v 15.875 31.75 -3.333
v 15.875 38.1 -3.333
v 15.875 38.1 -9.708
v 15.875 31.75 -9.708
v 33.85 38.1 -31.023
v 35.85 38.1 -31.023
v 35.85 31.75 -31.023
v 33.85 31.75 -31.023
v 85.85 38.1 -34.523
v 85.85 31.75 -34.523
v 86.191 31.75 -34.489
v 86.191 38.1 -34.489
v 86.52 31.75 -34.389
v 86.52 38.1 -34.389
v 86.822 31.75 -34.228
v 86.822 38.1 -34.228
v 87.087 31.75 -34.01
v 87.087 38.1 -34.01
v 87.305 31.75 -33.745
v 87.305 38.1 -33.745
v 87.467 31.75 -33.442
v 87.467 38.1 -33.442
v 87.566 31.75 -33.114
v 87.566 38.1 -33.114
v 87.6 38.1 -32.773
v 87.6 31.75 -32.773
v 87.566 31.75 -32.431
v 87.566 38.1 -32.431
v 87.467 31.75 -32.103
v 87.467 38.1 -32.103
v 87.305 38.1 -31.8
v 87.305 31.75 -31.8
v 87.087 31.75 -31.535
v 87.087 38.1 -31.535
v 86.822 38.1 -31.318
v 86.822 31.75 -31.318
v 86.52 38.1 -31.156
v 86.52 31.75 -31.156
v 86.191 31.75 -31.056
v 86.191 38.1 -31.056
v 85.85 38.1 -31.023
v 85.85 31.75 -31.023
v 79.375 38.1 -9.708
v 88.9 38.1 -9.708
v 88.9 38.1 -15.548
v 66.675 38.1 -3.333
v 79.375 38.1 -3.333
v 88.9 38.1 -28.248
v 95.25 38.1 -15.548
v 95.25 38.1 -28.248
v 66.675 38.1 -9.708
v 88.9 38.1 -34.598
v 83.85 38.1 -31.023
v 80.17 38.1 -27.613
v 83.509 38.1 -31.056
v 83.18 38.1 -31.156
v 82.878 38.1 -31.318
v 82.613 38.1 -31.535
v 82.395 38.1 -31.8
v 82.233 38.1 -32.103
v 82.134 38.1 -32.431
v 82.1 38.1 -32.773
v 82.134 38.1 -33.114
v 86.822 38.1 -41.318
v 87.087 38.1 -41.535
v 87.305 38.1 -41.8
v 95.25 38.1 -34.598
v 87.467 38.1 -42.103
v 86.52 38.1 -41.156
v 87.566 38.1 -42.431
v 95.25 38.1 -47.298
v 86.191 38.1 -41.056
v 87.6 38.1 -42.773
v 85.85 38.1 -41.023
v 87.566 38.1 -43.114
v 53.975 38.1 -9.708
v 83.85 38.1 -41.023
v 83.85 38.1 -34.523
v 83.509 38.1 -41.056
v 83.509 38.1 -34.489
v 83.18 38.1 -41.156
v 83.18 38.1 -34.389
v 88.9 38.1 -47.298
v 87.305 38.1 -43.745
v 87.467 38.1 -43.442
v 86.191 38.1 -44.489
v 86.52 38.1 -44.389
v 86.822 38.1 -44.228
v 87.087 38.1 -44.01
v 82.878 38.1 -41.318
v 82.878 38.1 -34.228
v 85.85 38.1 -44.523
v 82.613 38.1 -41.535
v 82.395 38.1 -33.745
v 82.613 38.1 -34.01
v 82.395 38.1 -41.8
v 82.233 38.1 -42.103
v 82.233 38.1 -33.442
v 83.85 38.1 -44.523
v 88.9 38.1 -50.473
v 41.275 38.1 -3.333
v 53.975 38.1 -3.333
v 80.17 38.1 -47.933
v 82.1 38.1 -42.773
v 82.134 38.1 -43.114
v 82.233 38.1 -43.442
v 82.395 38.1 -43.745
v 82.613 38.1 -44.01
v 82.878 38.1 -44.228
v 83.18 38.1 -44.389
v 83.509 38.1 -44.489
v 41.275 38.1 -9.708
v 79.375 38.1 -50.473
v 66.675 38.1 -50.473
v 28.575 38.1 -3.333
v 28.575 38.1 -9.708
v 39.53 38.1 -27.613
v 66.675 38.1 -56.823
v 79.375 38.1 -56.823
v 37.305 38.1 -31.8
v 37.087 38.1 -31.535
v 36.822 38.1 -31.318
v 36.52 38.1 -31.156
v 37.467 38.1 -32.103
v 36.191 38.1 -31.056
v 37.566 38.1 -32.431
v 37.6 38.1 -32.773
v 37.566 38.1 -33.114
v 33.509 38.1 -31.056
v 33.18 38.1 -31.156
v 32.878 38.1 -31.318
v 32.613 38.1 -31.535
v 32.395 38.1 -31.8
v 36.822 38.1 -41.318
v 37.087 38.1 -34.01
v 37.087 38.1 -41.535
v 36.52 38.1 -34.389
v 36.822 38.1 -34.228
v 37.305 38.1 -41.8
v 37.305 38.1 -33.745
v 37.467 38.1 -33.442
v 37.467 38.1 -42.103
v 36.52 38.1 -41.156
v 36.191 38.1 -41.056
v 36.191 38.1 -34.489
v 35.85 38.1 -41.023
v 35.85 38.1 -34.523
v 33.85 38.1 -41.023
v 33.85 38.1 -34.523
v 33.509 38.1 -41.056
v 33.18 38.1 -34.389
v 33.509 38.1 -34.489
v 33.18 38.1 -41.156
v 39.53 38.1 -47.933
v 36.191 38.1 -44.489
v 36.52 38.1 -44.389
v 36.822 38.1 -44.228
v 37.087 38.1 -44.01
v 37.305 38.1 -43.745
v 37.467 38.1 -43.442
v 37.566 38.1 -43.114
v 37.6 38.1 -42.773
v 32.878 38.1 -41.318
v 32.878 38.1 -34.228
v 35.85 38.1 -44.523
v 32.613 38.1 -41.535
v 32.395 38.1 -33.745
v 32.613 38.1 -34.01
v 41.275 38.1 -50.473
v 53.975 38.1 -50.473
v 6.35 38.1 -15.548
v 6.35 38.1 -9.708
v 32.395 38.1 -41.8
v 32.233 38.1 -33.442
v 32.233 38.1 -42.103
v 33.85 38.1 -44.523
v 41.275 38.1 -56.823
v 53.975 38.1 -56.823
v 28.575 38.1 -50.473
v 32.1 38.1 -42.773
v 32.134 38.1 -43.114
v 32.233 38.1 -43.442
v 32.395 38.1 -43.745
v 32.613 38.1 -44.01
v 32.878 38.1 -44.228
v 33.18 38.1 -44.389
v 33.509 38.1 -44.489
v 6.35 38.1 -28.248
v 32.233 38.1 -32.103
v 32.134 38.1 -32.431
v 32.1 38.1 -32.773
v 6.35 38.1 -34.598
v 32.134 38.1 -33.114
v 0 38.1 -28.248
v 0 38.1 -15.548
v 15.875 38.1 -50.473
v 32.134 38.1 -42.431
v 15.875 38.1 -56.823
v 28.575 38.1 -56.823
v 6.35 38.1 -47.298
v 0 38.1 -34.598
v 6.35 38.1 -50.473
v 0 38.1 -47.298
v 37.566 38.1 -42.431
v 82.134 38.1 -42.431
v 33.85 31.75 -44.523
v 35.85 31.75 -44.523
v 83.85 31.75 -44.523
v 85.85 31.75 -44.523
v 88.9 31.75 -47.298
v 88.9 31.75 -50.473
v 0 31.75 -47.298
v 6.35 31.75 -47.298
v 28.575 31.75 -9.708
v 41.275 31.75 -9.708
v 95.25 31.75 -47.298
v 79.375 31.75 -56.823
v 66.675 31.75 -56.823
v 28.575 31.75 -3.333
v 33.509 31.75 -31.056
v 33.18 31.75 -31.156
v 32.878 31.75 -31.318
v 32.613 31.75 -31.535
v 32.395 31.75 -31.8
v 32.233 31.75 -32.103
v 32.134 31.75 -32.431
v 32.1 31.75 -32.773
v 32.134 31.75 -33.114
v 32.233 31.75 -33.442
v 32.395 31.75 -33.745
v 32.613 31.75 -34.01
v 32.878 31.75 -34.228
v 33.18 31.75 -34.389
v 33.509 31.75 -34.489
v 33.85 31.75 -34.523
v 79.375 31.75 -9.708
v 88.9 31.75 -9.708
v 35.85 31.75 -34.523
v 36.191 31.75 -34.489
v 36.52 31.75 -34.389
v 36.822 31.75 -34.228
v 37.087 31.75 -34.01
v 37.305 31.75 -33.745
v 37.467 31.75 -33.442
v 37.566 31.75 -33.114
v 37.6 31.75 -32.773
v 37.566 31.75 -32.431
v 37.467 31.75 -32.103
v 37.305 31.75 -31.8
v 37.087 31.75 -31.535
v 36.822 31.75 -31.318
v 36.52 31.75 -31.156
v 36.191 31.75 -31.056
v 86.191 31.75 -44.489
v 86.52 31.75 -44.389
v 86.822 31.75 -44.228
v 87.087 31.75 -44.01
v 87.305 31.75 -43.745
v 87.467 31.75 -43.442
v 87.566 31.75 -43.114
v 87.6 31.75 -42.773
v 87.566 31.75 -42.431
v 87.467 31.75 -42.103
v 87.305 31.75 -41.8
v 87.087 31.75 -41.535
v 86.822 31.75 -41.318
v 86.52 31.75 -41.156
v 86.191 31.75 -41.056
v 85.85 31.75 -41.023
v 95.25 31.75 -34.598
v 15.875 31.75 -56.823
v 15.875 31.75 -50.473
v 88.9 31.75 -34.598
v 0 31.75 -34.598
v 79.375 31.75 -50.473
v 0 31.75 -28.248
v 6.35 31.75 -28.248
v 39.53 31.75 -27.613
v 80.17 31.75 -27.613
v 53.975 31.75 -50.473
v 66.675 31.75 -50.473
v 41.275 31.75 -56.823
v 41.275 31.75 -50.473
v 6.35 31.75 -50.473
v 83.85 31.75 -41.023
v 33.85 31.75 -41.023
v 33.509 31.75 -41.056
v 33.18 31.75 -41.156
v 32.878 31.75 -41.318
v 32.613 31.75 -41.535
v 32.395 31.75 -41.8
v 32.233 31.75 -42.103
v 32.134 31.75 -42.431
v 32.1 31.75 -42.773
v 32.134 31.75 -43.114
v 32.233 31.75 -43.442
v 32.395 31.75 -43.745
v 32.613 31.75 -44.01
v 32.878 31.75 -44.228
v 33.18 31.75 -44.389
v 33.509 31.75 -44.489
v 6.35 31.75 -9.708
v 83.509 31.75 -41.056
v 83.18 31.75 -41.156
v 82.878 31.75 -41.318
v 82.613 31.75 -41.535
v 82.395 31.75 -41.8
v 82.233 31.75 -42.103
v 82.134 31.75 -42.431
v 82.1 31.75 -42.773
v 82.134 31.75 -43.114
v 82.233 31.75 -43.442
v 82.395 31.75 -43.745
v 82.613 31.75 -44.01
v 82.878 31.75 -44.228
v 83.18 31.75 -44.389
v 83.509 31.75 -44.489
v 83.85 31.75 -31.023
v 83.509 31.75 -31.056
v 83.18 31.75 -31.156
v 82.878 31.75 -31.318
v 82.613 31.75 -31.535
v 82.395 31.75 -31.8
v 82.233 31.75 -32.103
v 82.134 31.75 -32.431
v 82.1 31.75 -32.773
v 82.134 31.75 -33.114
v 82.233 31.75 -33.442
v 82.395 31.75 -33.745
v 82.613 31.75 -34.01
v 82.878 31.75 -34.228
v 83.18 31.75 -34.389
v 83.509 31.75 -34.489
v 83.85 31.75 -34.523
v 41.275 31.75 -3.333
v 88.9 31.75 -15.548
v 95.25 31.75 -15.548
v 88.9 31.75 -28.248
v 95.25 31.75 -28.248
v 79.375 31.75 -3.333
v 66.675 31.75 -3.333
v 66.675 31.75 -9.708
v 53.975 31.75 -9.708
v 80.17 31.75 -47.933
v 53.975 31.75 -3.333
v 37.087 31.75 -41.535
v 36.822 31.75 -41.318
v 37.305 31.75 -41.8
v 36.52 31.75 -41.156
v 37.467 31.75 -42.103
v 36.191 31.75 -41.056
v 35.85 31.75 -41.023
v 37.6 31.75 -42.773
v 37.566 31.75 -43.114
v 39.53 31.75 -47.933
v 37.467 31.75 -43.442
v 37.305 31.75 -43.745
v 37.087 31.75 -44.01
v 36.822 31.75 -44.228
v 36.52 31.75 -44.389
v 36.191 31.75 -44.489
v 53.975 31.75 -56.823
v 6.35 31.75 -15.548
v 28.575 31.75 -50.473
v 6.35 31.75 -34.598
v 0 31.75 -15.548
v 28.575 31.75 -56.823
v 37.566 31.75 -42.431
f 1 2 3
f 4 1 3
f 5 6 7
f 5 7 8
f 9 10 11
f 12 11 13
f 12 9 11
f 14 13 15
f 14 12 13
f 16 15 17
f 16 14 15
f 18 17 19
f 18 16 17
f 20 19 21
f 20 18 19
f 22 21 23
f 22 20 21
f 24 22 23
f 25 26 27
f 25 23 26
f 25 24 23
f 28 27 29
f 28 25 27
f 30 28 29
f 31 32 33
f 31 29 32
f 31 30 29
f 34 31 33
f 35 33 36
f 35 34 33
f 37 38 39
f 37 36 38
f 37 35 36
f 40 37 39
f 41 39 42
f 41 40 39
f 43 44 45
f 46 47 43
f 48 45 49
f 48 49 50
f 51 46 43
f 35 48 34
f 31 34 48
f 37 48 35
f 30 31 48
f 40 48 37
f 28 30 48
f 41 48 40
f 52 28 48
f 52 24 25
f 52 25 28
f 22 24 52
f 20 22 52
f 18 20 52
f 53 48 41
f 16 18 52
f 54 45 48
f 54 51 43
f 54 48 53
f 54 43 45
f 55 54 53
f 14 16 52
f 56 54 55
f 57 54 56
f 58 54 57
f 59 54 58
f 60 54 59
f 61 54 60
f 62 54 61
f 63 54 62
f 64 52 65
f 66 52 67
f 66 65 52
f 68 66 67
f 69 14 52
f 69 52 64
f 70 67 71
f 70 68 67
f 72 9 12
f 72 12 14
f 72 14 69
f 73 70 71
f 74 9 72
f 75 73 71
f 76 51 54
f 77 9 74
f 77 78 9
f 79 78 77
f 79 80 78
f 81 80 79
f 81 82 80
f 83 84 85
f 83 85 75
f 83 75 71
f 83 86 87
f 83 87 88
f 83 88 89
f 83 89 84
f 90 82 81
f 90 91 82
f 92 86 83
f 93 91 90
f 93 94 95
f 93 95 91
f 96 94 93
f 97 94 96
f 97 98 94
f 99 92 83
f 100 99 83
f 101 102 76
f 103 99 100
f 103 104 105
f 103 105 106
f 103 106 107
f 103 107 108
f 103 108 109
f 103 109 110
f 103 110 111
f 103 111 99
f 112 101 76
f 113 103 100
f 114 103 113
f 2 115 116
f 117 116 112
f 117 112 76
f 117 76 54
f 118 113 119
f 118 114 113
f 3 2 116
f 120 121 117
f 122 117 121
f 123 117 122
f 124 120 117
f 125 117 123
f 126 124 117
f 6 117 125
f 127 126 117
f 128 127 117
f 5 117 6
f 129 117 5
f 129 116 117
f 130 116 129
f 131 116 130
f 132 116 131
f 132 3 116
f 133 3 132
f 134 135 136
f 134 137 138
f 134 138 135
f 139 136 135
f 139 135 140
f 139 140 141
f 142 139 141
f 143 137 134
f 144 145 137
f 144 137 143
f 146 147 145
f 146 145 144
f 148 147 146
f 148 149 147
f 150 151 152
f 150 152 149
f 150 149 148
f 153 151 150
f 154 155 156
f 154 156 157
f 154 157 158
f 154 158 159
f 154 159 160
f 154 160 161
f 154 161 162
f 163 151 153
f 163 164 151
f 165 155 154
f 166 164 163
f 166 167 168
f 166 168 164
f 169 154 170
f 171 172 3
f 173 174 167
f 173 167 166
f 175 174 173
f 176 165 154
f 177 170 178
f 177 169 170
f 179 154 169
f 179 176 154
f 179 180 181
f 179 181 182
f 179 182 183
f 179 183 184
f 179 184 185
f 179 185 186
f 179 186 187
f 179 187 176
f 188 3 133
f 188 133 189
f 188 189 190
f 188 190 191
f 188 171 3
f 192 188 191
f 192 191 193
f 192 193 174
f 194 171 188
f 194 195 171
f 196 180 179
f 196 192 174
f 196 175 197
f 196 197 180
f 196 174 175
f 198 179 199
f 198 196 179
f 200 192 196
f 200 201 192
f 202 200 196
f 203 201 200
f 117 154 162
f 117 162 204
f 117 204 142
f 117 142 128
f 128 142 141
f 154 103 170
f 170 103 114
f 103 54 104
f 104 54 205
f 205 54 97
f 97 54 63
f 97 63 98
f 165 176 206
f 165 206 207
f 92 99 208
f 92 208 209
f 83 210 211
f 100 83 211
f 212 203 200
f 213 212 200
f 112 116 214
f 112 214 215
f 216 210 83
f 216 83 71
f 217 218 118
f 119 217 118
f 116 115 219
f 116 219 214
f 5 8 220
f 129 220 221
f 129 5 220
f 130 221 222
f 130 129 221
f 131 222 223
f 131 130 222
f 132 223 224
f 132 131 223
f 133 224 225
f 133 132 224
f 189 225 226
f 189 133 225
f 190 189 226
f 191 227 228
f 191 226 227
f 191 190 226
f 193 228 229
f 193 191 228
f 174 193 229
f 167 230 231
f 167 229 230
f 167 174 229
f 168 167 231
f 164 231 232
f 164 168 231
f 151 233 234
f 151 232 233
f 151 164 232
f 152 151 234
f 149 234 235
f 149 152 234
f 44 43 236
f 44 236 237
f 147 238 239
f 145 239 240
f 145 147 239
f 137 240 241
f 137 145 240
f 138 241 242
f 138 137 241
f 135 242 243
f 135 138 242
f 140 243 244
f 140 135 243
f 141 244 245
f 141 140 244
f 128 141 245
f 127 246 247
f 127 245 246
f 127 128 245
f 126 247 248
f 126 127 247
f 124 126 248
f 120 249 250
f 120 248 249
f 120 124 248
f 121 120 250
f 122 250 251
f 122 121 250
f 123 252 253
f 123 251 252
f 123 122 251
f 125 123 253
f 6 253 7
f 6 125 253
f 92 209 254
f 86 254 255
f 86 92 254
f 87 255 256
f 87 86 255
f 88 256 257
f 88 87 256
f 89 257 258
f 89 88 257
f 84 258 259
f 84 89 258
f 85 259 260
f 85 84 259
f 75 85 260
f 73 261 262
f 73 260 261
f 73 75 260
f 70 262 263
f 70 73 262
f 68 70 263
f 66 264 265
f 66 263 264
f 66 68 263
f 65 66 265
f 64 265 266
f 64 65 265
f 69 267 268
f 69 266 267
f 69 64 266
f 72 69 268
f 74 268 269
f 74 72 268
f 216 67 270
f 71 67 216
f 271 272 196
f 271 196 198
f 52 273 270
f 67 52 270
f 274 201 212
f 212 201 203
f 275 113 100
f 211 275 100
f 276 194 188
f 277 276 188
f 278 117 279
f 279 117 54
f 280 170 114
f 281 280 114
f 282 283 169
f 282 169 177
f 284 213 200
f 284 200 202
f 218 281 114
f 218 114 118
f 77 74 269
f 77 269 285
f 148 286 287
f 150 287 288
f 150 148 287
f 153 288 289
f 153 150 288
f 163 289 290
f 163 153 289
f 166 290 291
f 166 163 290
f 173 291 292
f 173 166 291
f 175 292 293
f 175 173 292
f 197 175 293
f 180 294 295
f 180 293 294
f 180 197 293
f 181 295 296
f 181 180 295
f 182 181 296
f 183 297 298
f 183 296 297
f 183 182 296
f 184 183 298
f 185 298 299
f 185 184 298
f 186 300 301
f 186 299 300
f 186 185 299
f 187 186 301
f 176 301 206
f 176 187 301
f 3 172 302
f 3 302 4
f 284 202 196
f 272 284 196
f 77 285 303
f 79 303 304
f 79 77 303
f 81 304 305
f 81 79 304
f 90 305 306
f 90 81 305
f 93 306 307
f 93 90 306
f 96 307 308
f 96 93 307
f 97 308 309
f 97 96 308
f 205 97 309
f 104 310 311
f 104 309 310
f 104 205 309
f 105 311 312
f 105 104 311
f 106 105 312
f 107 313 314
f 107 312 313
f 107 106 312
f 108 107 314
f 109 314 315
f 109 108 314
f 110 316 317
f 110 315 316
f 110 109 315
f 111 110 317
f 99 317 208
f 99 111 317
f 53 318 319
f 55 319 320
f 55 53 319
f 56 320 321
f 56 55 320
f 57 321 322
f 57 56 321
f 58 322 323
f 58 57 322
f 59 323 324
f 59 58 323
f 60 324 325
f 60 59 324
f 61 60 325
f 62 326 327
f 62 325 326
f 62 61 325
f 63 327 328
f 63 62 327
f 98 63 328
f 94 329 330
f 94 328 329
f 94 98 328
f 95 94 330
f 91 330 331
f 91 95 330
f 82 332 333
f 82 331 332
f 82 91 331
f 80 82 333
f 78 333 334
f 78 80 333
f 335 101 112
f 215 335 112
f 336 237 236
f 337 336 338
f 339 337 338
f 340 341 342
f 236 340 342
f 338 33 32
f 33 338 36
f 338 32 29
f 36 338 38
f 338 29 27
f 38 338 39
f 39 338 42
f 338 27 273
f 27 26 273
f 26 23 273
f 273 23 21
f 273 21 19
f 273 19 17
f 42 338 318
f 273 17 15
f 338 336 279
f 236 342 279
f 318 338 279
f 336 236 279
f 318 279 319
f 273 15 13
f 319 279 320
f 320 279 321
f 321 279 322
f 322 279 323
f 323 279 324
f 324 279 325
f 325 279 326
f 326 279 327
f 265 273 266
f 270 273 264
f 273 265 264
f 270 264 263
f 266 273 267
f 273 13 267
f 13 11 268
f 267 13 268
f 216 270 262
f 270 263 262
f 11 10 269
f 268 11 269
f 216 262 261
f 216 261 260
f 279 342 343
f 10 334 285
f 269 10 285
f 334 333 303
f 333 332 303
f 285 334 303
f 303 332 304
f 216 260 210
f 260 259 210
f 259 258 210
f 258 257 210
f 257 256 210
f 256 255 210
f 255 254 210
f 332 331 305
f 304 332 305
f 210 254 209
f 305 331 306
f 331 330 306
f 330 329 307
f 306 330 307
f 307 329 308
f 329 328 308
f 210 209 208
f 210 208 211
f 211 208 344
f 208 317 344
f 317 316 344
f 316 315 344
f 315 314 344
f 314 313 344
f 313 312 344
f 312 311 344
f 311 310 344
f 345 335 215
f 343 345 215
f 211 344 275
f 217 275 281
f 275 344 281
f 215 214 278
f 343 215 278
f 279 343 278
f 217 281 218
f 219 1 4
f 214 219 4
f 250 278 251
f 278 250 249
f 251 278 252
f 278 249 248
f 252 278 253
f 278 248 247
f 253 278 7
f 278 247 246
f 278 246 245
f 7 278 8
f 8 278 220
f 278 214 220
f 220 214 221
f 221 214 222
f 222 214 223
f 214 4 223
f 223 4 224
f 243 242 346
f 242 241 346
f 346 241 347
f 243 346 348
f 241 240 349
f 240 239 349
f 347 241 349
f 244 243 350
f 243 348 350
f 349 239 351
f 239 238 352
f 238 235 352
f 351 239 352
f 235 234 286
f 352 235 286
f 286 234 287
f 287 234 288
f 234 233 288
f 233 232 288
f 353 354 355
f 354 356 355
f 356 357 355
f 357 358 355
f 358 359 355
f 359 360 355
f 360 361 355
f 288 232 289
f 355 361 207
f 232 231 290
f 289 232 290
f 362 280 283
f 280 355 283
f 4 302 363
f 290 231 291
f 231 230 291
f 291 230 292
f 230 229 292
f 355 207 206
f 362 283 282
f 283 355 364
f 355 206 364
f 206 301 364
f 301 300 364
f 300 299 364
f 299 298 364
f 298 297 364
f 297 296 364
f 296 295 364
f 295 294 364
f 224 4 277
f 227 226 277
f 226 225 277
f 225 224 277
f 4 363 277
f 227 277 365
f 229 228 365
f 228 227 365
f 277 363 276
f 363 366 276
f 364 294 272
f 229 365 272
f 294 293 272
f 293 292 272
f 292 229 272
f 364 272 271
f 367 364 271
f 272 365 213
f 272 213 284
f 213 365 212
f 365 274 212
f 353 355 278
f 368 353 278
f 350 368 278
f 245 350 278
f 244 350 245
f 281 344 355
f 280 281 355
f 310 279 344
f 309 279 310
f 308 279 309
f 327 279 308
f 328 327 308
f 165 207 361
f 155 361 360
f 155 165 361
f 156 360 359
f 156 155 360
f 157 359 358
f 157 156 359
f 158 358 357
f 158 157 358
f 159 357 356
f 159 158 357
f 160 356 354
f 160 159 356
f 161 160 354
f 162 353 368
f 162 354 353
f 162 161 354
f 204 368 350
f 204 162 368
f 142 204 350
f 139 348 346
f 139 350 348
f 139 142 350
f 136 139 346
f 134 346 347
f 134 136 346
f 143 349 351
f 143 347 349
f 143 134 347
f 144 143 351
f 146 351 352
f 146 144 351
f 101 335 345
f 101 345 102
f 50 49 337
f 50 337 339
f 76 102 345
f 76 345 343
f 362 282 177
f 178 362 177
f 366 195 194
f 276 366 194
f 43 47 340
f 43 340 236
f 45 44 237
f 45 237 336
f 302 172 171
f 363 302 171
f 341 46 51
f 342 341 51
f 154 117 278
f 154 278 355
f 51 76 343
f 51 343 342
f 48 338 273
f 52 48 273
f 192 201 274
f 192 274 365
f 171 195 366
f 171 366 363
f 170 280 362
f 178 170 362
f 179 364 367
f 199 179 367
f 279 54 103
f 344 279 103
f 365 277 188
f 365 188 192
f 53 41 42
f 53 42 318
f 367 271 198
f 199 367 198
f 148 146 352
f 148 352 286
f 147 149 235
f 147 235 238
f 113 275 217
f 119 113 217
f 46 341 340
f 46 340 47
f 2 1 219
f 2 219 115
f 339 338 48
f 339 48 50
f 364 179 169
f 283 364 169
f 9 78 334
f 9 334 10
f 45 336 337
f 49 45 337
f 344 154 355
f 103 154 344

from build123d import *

# Parameters (mm, degrees)
SKETCH2_W           = 53.489335428
SKETCH2_H           = 6.35
BOSS_EXTRUDE1_DEPTH = 95.25
SKETCH3_W           = 6.35
SKETCH3_H           = 6.35
CUT_EXTRUDE1_DEPTH  = 7.35
LPATTERN1_COUNT     = 3
LPATTERN1_PITCH     = 19.05
SKETCH5_W           = 15.875
SKETCH5_H           = 6.374255969
SKETCH5_W_2         = 12.7
SKETCH5_H_2         = 6.35
CUT_EXTRUDE2_DEPTH  = 7.35
SKETCH7_W           = 40.64
SKETCH7_H           = 20.32
CUT_EXTRUDE4_DEPTH  = 7.35


with BuildPart() as part:
    # Sketch2 → Boss-Extrude1 (new body)
    with BuildSketch(Plane(origin=(0, 0, 0), x_dir=(0, 0, -1), z_dir=(1, 0, 0))):
        with Locations((30.077985794, 34.925)):
            Rectangle(SKETCH2_W, SKETCH2_H)
    extrude(amount=BOSS_EXTRUDE1_DEPTH)

    # Sketch3 → Cut-Extrude1 (cut, through all)
    with BuildSketch(Plane(origin=(0, 38.1, 0), x_dir=(1, 0, 0), z_dir=(0, 1, 0))):
        with Locations((3.175, 50.472653508)):
            Rectangle(SKETCH3_W, SKETCH3_H)
        with Locations((92.075, 50.472653508)):
            Rectangle(SKETCH3_W, SKETCH3_H)
    cut_extrude1 = extrude(amount=-CUT_EXTRUDE1_DEPTH, mode=Mode.SUBTRACT)

    # LPattern1: Cut-Extrude1 ×3
    with Locations(*[(0, 0, i * LPATTERN1_PITCH) for i in range(1, LPATTERN1_COUNT)]):
        add(cut_extrude1, mode=Mode.SUBTRACT)

    # Sketch5 → Cut-Extrude2 (cut, through all)
    with BuildSketch(Plane(origin=(0, 38.1, 0), x_dir=(1, 0, 0), z_dir=(0, 1, 0))):
        with Locations((7.9375, 6.520446064)):
            Rectangle(SKETCH5_W, SKETCH5_H)
        with Locations((34.925, 6.520446064)):
            Rectangle(SKETCH5_W_2, SKETCH5_H)
        with Locations((60.325, 6.520446064)):
            Rectangle(SKETCH5_W_2, SKETCH5_H)
        with Locations((87.3125, 6.520446064)):
            Rectangle(SKETCH5_W, SKETCH5_H)
        with Locations((7.9375, 53.647653508)):
            Rectangle(SKETCH5_W, SKETCH5_H_2)
        with Locations((34.925, 53.647653508)):
            Rectangle(SKETCH5_W_2, SKETCH5_H_2)
        with Locations((60.325, 53.647653508)):
            Rectangle(SKETCH5_W_2, SKETCH5_H_2)
        with Locations((87.3125, 53.647653508)):
            Rectangle(SKETCH5_W, SKETCH5_H_2)
    extrude(amount=-CUT_EXTRUDE2_DEPTH, mode=Mode.SUBTRACT)

    # Sketch7 → Cut-Extrude4 (cut, through all)
    with BuildSketch(Plane(origin=(0, 38.1, 0), x_dir=(1, 0, 0), z_dir=(0, 1, 0))):
        with Locations((59.85, 37.772653508)):
            Rectangle(SKETCH7_W, SKETCH7_H)
        with BuildLine():
            Line((83.85, 44.522653508), (85.85, 44.522653508))
            ThreePointArc((85.85, 44.522653508), (87.6, 42.772653508), (85.85, 41.022653508))
            Line((85.85, 41.022653508), (83.85, 41.022653508))
            ThreePointArc((83.85, 41.022653508), (82.1, 42.772653508), (83.85, 44.522653508))
        make_face()
        with BuildLine():
            Line((83.85, 34.522653508), (85.85, 34.522653508))
            ThreePointArc((85.85, 34.522653508), (87.6, 32.772653508), (85.85, 31.022653508))
            Line((85.85, 31.022653508), (83.85, 31.022653508))
            ThreePointArc((83.85, 31.022653508), (82.1, 32.772653508), (83.85, 34.522653508))
        make_face()
        with BuildLine():
            Line((35.85, 41.022653508), (33.85, 41.022653508))
            ThreePointArc((33.85, 41.022653508), (32.1, 42.772653508), (33.85, 44.522653508))
            Line((33.85, 44.522653508), (35.85, 44.522653508))
            ThreePointArc((35.85, 44.522653508), (37.6, 42.772653508), (35.85, 41.022653508))
        make_face()
        with BuildLine():
            Line((35.85, 31.022653508), (33.85, 31.022653508))
            ThreePointArc((33.85, 31.022653508), (32.1, 32.772653508), (33.85, 34.522653508))
            Line((33.85, 34.522653508), (35.85, 34.522653508))
            ThreePointArc((35.85, 34.522653508), (37.6, 32.772653508), (35.85, 31.022653508))
        make_face()
    extrude(amount=-CUT_EXTRUDE4_DEPTH, mode=Mode.SUBTRACT)


solid = part.part
